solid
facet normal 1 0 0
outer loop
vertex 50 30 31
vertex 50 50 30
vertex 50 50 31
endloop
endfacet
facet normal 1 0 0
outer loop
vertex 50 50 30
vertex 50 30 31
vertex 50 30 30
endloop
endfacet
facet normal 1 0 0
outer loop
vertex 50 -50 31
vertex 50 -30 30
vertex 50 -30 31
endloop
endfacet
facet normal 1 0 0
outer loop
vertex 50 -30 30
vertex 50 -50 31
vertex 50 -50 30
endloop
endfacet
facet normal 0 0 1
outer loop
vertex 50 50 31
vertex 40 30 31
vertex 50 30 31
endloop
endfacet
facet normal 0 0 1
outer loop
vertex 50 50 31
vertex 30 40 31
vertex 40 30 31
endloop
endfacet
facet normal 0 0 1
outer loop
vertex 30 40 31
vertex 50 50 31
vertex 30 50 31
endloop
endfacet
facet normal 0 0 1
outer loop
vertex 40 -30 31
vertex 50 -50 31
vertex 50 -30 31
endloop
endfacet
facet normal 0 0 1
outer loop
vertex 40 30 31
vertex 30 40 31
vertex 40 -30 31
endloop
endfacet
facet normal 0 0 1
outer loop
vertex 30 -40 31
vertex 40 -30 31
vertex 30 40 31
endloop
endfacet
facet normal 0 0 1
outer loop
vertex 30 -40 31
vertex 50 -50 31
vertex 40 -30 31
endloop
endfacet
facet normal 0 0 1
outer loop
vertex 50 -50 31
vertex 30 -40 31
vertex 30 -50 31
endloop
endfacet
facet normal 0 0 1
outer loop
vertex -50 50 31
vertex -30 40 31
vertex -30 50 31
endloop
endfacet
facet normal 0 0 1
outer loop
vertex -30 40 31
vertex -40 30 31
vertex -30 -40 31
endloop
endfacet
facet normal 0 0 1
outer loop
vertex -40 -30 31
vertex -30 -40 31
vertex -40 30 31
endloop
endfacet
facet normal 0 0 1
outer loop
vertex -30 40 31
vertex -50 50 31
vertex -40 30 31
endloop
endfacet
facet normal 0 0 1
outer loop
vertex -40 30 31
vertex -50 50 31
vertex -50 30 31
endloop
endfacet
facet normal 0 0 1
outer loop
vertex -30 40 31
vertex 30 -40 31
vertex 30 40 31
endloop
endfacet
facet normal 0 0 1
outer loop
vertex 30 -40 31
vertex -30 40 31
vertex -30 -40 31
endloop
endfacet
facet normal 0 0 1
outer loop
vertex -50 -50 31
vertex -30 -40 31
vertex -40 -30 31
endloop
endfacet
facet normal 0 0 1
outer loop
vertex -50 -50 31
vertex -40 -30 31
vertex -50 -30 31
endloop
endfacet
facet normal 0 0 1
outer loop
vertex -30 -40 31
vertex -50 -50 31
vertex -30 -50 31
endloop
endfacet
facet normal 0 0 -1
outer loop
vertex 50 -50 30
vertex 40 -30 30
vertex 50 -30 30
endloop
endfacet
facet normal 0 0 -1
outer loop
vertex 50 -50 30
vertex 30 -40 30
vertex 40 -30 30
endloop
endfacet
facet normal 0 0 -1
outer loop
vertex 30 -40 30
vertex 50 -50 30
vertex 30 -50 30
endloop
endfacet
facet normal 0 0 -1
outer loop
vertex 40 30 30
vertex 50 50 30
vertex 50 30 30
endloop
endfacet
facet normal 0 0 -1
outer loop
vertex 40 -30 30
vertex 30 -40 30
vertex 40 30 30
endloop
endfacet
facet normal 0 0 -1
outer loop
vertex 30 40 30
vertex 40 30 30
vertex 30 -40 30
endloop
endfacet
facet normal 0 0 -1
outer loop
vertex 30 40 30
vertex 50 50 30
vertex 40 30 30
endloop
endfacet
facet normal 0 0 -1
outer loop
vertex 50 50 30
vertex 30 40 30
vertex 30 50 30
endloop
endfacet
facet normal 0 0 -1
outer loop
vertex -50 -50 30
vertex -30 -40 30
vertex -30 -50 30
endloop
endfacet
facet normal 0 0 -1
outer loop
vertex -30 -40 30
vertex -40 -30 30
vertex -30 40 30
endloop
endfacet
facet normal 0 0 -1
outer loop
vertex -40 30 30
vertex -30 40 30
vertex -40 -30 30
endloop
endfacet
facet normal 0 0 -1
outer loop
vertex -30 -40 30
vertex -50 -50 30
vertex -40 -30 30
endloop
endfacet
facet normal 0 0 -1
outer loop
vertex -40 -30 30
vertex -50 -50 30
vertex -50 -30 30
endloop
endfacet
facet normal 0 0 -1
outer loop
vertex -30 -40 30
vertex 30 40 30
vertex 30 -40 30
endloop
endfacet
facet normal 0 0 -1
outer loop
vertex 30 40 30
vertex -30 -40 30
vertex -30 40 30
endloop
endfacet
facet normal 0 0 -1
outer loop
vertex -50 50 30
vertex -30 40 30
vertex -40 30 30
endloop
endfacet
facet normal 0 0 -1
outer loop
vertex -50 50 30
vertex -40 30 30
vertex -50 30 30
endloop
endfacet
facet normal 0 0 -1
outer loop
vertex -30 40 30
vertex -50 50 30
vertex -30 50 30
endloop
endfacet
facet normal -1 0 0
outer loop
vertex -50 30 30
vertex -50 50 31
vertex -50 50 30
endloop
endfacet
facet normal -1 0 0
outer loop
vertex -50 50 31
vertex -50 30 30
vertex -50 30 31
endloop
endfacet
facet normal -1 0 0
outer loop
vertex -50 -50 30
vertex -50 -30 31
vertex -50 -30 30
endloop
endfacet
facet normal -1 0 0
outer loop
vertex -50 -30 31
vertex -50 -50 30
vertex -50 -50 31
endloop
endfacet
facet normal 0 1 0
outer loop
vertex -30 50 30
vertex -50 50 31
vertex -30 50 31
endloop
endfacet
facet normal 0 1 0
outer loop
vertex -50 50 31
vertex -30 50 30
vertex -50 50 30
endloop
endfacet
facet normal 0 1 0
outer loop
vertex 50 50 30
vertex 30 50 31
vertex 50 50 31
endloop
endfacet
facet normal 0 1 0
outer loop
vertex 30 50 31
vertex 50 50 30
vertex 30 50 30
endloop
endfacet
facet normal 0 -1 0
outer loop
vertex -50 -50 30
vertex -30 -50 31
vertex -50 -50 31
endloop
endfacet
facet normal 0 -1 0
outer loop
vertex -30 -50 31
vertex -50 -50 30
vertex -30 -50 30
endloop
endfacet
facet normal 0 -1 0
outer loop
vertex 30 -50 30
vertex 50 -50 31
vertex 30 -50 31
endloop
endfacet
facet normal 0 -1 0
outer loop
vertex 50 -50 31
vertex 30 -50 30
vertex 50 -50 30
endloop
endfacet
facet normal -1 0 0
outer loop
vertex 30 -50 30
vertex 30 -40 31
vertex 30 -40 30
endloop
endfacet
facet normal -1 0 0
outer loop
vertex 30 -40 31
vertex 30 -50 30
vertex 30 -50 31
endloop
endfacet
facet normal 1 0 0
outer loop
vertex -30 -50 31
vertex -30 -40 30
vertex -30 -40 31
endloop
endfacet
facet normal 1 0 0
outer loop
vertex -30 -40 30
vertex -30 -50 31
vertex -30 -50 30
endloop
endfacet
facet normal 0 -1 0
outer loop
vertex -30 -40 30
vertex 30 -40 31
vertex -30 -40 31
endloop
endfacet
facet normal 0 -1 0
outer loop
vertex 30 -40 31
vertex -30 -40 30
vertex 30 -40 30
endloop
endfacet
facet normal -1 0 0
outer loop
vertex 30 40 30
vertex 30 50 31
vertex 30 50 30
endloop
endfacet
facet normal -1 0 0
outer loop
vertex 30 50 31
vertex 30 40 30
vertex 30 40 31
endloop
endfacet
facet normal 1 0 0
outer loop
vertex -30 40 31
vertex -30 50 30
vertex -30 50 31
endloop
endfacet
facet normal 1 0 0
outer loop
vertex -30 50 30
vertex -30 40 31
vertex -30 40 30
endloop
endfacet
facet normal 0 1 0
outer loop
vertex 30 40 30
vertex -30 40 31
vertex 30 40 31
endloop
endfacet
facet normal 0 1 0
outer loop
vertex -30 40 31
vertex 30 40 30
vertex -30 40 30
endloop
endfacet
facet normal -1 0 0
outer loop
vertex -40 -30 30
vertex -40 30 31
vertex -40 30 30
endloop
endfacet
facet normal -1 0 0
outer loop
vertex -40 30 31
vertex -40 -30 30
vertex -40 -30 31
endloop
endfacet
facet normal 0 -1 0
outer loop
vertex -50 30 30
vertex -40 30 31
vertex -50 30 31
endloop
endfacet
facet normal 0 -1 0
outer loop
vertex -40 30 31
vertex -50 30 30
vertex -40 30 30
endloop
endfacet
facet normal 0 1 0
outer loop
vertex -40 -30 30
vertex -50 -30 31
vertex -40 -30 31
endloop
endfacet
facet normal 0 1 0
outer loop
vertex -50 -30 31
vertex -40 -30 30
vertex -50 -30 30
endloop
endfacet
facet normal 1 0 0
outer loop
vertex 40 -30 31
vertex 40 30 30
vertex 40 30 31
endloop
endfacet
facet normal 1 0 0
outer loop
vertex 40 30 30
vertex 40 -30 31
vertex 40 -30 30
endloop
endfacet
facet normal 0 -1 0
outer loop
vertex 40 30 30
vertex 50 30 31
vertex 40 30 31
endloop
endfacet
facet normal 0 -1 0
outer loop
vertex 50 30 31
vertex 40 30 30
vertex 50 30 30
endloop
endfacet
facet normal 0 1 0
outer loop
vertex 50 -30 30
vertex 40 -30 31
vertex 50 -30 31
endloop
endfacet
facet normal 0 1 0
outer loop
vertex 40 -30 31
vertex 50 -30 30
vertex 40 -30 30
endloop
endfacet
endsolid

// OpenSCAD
Altura = 130;
Ancho = 100;
Grosor = 1;

Hueco_motor_diametro = 5.5;

Hueco_LCD_h = 24;
Hueco_LCD_w = 71;

Hueco_base_w = 50;
Hueco_base_h = 86;

Soporte = Ancho;
Correccion_soporte_largo = Ancho - 40;
Correccion_soporte_ancho = 10;

Repisa1 = Altura-50;
Repisa2 = Altura-100;

Altura_Nema17 = 42.3;

Taco = 2;

Abertura = 10;
Abertura_h = 20;
/*
rotate([0,0,90])
translate([-20, -4 , Repisa1])
import("/home/javier/Downloads/Raspberry.stl");
*/
/*
difference(){

union(){
    
    //Paredes
    
    //Perpendiculares al eje y (frente y fondo)
    
    translate([-Ancho/2,-Ancho/2,0])
    cube([Ancho,Grosor,Altura], center = false);
    
    translate([-Ancho/2, Ancho/2,0])
    cube([Ancho,Grosor,Altura], center = false);
        
        
    //Perpendiculares al eje x (lados)
    translate([-Ancho/2,-Ancho/2,0])
    cube([Grosor,Ancho,Altura], center = false);
    
    translate([Ancho/2,-Ancho/2,0])
    cube([Grosor,Ancho+Grosor,Altura], center = false);


    
    //Tacos Sujecion Repisa1
        
        
    translate([-Ancho/2 + Grosor, -Ancho/2 + Grosor, Repisa1-Taco])
    cube([Taco,Taco,Taco], center = false);
    translate([-Ancho/2 + Grosor, Ancho/2-Taco, Repisa1-Taco])
    cube([Taco,Taco,Taco], center = false);
    translate([Ancho/2 - Taco, -Ancho/2+Grosor, Repisa1-Taco])
    cube([Taco,Taco,Taco], center = false);
    translate([Ancho/2 - Taco, Ancho/2-Taco, Repisa1-Taco])
    cube([Taco,Taco,Taco], center = false);  
      
    //Tacos Sujecion Repisa2
        
        
    translate([-Ancho/2 + Grosor, -Ancho/2 + Grosor, Repisa2-Taco])
    cube([Taco,Taco,Taco], center = false);
    translate([-Ancho/2 + Grosor, Ancho/2-Taco, Repisa2-Taco])
    cube([Taco,Taco,Taco], center = false);
    translate([Ancho/2 - Taco, -Ancho/2+Grosor, Repisa2-Taco])
    cube([Taco,Taco,Taco], center = false);
    translate([Ancho/2 - Taco, Ancho/2-Taco, Repisa2-Taco])
    cube([Taco,Taco,Taco], center = false);      
    


    };
    
        
        //Hueco Motor Nema17
        translate([0, Ancho/2 + Grosor, Repisa1 + 1/2 * Altura_Nema17])
        rotate([90, 0, 0])
        cylinder(h=Grosor, d=5);
    
        
        //Hueco LCD
        translate([Ancho/2, -Hueco_LCD_w/2, Altura - Hueco_LCD_h - 2])
        cube([Grosor, Hueco_LCD_w, Hueco_LCD_h], center = false);
        
        //Abertura en paredes Suelo
        translate([-Ancho/2+Abertura,-Ancho/2,0])
        cube([Ancho-Abertura*2,Grosor,Abertura_h], center = false);
    
        translate([-Ancho/2+Abertura,Ancho/2,0])
        cube([Ancho-Abertura*2,Grosor,Abertura_h], center = false);
    
        translate([-Ancho/2,-Ancho/2 + Abertura,0])
        cube([Grosor,Ancho-Abertura*2,Abertura_h], center = false);
        
        translate([Ancho/2,-Ancho/2 + Abertura,0])
        cube([Grosor,Ancho-Abertura*2,Abertura_h], center = false);
        
        //Abertura en pared Trasera
        translate([-Ancho/2+Abertura,-Ancho/2,Repisa2+Grosor])
        cube([Ancho-Abertura*2,Grosor,Abertura_h], center = false);
        
        //Abertura en pared Trasera
        translate([-Ancho/2+Abertura,-Ancho/2,Repisa1+Grosor])
        cube([Ancho-Abertura*2,Grosor,Abertura_h], center = false);
        
        
    
};
   

        
   
*/
/*
    
    //creacion de Repisa1
    difference(){
        translate([-Ancho/2, -Ancho/2, Repisa1])
            cube([Soporte, Soporte, Grosor], center = false);
        translate([-Ancho/2+20, -Ancho/2, Repisa1])
            cube([Correccion_soporte_largo, Correccion_soporte_ancho, Grosor], center = false);
        translate([-Ancho/2, -Ancho/2 +20, Repisa1])
            cube([Correccion_soporte_ancho, Correccion_soporte_largo, Grosor], center = false);
        translate([Ancho/2-10, -Ancho/2 +20, Repisa1])
            cube([Correccion_soporte_ancho, Correccion_soporte_largo, Grosor], center = false);
        translate([0, 0, Repisa1])
            cylinder(h=Grosor, d = 15);
        };        
   
*/    
    //creacion de Repisa2
    difference(){
        translate([-Ancho/2, -Ancho/2, Repisa2])
            cube([Soporte, Soporte, Grosor], center = false);
        translate([-Ancho/2+20, -Ancho/2, Repisa2])
            cube([Correccion_soporte_largo, Correccion_soporte_ancho, Grosor], center = false);
        translate([-Ancho/2+20, Ancho/2 -10, Repisa2])
            cube([Correccion_soporte_largo, Correccion_soporte_ancho, Grosor], center = false);
        translate([-Ancho/2, -Ancho/2 +20, Repisa2])
            cube([Correccion_soporte_ancho, Correccion_soporte_largo, Grosor], center = false);
        translate([Ancho/2-10, -Ancho/2 +20, Repisa2])
            cube([Correccion_soporte_ancho, Correccion_soporte_largo, Grosor], center = false);
        };
      
